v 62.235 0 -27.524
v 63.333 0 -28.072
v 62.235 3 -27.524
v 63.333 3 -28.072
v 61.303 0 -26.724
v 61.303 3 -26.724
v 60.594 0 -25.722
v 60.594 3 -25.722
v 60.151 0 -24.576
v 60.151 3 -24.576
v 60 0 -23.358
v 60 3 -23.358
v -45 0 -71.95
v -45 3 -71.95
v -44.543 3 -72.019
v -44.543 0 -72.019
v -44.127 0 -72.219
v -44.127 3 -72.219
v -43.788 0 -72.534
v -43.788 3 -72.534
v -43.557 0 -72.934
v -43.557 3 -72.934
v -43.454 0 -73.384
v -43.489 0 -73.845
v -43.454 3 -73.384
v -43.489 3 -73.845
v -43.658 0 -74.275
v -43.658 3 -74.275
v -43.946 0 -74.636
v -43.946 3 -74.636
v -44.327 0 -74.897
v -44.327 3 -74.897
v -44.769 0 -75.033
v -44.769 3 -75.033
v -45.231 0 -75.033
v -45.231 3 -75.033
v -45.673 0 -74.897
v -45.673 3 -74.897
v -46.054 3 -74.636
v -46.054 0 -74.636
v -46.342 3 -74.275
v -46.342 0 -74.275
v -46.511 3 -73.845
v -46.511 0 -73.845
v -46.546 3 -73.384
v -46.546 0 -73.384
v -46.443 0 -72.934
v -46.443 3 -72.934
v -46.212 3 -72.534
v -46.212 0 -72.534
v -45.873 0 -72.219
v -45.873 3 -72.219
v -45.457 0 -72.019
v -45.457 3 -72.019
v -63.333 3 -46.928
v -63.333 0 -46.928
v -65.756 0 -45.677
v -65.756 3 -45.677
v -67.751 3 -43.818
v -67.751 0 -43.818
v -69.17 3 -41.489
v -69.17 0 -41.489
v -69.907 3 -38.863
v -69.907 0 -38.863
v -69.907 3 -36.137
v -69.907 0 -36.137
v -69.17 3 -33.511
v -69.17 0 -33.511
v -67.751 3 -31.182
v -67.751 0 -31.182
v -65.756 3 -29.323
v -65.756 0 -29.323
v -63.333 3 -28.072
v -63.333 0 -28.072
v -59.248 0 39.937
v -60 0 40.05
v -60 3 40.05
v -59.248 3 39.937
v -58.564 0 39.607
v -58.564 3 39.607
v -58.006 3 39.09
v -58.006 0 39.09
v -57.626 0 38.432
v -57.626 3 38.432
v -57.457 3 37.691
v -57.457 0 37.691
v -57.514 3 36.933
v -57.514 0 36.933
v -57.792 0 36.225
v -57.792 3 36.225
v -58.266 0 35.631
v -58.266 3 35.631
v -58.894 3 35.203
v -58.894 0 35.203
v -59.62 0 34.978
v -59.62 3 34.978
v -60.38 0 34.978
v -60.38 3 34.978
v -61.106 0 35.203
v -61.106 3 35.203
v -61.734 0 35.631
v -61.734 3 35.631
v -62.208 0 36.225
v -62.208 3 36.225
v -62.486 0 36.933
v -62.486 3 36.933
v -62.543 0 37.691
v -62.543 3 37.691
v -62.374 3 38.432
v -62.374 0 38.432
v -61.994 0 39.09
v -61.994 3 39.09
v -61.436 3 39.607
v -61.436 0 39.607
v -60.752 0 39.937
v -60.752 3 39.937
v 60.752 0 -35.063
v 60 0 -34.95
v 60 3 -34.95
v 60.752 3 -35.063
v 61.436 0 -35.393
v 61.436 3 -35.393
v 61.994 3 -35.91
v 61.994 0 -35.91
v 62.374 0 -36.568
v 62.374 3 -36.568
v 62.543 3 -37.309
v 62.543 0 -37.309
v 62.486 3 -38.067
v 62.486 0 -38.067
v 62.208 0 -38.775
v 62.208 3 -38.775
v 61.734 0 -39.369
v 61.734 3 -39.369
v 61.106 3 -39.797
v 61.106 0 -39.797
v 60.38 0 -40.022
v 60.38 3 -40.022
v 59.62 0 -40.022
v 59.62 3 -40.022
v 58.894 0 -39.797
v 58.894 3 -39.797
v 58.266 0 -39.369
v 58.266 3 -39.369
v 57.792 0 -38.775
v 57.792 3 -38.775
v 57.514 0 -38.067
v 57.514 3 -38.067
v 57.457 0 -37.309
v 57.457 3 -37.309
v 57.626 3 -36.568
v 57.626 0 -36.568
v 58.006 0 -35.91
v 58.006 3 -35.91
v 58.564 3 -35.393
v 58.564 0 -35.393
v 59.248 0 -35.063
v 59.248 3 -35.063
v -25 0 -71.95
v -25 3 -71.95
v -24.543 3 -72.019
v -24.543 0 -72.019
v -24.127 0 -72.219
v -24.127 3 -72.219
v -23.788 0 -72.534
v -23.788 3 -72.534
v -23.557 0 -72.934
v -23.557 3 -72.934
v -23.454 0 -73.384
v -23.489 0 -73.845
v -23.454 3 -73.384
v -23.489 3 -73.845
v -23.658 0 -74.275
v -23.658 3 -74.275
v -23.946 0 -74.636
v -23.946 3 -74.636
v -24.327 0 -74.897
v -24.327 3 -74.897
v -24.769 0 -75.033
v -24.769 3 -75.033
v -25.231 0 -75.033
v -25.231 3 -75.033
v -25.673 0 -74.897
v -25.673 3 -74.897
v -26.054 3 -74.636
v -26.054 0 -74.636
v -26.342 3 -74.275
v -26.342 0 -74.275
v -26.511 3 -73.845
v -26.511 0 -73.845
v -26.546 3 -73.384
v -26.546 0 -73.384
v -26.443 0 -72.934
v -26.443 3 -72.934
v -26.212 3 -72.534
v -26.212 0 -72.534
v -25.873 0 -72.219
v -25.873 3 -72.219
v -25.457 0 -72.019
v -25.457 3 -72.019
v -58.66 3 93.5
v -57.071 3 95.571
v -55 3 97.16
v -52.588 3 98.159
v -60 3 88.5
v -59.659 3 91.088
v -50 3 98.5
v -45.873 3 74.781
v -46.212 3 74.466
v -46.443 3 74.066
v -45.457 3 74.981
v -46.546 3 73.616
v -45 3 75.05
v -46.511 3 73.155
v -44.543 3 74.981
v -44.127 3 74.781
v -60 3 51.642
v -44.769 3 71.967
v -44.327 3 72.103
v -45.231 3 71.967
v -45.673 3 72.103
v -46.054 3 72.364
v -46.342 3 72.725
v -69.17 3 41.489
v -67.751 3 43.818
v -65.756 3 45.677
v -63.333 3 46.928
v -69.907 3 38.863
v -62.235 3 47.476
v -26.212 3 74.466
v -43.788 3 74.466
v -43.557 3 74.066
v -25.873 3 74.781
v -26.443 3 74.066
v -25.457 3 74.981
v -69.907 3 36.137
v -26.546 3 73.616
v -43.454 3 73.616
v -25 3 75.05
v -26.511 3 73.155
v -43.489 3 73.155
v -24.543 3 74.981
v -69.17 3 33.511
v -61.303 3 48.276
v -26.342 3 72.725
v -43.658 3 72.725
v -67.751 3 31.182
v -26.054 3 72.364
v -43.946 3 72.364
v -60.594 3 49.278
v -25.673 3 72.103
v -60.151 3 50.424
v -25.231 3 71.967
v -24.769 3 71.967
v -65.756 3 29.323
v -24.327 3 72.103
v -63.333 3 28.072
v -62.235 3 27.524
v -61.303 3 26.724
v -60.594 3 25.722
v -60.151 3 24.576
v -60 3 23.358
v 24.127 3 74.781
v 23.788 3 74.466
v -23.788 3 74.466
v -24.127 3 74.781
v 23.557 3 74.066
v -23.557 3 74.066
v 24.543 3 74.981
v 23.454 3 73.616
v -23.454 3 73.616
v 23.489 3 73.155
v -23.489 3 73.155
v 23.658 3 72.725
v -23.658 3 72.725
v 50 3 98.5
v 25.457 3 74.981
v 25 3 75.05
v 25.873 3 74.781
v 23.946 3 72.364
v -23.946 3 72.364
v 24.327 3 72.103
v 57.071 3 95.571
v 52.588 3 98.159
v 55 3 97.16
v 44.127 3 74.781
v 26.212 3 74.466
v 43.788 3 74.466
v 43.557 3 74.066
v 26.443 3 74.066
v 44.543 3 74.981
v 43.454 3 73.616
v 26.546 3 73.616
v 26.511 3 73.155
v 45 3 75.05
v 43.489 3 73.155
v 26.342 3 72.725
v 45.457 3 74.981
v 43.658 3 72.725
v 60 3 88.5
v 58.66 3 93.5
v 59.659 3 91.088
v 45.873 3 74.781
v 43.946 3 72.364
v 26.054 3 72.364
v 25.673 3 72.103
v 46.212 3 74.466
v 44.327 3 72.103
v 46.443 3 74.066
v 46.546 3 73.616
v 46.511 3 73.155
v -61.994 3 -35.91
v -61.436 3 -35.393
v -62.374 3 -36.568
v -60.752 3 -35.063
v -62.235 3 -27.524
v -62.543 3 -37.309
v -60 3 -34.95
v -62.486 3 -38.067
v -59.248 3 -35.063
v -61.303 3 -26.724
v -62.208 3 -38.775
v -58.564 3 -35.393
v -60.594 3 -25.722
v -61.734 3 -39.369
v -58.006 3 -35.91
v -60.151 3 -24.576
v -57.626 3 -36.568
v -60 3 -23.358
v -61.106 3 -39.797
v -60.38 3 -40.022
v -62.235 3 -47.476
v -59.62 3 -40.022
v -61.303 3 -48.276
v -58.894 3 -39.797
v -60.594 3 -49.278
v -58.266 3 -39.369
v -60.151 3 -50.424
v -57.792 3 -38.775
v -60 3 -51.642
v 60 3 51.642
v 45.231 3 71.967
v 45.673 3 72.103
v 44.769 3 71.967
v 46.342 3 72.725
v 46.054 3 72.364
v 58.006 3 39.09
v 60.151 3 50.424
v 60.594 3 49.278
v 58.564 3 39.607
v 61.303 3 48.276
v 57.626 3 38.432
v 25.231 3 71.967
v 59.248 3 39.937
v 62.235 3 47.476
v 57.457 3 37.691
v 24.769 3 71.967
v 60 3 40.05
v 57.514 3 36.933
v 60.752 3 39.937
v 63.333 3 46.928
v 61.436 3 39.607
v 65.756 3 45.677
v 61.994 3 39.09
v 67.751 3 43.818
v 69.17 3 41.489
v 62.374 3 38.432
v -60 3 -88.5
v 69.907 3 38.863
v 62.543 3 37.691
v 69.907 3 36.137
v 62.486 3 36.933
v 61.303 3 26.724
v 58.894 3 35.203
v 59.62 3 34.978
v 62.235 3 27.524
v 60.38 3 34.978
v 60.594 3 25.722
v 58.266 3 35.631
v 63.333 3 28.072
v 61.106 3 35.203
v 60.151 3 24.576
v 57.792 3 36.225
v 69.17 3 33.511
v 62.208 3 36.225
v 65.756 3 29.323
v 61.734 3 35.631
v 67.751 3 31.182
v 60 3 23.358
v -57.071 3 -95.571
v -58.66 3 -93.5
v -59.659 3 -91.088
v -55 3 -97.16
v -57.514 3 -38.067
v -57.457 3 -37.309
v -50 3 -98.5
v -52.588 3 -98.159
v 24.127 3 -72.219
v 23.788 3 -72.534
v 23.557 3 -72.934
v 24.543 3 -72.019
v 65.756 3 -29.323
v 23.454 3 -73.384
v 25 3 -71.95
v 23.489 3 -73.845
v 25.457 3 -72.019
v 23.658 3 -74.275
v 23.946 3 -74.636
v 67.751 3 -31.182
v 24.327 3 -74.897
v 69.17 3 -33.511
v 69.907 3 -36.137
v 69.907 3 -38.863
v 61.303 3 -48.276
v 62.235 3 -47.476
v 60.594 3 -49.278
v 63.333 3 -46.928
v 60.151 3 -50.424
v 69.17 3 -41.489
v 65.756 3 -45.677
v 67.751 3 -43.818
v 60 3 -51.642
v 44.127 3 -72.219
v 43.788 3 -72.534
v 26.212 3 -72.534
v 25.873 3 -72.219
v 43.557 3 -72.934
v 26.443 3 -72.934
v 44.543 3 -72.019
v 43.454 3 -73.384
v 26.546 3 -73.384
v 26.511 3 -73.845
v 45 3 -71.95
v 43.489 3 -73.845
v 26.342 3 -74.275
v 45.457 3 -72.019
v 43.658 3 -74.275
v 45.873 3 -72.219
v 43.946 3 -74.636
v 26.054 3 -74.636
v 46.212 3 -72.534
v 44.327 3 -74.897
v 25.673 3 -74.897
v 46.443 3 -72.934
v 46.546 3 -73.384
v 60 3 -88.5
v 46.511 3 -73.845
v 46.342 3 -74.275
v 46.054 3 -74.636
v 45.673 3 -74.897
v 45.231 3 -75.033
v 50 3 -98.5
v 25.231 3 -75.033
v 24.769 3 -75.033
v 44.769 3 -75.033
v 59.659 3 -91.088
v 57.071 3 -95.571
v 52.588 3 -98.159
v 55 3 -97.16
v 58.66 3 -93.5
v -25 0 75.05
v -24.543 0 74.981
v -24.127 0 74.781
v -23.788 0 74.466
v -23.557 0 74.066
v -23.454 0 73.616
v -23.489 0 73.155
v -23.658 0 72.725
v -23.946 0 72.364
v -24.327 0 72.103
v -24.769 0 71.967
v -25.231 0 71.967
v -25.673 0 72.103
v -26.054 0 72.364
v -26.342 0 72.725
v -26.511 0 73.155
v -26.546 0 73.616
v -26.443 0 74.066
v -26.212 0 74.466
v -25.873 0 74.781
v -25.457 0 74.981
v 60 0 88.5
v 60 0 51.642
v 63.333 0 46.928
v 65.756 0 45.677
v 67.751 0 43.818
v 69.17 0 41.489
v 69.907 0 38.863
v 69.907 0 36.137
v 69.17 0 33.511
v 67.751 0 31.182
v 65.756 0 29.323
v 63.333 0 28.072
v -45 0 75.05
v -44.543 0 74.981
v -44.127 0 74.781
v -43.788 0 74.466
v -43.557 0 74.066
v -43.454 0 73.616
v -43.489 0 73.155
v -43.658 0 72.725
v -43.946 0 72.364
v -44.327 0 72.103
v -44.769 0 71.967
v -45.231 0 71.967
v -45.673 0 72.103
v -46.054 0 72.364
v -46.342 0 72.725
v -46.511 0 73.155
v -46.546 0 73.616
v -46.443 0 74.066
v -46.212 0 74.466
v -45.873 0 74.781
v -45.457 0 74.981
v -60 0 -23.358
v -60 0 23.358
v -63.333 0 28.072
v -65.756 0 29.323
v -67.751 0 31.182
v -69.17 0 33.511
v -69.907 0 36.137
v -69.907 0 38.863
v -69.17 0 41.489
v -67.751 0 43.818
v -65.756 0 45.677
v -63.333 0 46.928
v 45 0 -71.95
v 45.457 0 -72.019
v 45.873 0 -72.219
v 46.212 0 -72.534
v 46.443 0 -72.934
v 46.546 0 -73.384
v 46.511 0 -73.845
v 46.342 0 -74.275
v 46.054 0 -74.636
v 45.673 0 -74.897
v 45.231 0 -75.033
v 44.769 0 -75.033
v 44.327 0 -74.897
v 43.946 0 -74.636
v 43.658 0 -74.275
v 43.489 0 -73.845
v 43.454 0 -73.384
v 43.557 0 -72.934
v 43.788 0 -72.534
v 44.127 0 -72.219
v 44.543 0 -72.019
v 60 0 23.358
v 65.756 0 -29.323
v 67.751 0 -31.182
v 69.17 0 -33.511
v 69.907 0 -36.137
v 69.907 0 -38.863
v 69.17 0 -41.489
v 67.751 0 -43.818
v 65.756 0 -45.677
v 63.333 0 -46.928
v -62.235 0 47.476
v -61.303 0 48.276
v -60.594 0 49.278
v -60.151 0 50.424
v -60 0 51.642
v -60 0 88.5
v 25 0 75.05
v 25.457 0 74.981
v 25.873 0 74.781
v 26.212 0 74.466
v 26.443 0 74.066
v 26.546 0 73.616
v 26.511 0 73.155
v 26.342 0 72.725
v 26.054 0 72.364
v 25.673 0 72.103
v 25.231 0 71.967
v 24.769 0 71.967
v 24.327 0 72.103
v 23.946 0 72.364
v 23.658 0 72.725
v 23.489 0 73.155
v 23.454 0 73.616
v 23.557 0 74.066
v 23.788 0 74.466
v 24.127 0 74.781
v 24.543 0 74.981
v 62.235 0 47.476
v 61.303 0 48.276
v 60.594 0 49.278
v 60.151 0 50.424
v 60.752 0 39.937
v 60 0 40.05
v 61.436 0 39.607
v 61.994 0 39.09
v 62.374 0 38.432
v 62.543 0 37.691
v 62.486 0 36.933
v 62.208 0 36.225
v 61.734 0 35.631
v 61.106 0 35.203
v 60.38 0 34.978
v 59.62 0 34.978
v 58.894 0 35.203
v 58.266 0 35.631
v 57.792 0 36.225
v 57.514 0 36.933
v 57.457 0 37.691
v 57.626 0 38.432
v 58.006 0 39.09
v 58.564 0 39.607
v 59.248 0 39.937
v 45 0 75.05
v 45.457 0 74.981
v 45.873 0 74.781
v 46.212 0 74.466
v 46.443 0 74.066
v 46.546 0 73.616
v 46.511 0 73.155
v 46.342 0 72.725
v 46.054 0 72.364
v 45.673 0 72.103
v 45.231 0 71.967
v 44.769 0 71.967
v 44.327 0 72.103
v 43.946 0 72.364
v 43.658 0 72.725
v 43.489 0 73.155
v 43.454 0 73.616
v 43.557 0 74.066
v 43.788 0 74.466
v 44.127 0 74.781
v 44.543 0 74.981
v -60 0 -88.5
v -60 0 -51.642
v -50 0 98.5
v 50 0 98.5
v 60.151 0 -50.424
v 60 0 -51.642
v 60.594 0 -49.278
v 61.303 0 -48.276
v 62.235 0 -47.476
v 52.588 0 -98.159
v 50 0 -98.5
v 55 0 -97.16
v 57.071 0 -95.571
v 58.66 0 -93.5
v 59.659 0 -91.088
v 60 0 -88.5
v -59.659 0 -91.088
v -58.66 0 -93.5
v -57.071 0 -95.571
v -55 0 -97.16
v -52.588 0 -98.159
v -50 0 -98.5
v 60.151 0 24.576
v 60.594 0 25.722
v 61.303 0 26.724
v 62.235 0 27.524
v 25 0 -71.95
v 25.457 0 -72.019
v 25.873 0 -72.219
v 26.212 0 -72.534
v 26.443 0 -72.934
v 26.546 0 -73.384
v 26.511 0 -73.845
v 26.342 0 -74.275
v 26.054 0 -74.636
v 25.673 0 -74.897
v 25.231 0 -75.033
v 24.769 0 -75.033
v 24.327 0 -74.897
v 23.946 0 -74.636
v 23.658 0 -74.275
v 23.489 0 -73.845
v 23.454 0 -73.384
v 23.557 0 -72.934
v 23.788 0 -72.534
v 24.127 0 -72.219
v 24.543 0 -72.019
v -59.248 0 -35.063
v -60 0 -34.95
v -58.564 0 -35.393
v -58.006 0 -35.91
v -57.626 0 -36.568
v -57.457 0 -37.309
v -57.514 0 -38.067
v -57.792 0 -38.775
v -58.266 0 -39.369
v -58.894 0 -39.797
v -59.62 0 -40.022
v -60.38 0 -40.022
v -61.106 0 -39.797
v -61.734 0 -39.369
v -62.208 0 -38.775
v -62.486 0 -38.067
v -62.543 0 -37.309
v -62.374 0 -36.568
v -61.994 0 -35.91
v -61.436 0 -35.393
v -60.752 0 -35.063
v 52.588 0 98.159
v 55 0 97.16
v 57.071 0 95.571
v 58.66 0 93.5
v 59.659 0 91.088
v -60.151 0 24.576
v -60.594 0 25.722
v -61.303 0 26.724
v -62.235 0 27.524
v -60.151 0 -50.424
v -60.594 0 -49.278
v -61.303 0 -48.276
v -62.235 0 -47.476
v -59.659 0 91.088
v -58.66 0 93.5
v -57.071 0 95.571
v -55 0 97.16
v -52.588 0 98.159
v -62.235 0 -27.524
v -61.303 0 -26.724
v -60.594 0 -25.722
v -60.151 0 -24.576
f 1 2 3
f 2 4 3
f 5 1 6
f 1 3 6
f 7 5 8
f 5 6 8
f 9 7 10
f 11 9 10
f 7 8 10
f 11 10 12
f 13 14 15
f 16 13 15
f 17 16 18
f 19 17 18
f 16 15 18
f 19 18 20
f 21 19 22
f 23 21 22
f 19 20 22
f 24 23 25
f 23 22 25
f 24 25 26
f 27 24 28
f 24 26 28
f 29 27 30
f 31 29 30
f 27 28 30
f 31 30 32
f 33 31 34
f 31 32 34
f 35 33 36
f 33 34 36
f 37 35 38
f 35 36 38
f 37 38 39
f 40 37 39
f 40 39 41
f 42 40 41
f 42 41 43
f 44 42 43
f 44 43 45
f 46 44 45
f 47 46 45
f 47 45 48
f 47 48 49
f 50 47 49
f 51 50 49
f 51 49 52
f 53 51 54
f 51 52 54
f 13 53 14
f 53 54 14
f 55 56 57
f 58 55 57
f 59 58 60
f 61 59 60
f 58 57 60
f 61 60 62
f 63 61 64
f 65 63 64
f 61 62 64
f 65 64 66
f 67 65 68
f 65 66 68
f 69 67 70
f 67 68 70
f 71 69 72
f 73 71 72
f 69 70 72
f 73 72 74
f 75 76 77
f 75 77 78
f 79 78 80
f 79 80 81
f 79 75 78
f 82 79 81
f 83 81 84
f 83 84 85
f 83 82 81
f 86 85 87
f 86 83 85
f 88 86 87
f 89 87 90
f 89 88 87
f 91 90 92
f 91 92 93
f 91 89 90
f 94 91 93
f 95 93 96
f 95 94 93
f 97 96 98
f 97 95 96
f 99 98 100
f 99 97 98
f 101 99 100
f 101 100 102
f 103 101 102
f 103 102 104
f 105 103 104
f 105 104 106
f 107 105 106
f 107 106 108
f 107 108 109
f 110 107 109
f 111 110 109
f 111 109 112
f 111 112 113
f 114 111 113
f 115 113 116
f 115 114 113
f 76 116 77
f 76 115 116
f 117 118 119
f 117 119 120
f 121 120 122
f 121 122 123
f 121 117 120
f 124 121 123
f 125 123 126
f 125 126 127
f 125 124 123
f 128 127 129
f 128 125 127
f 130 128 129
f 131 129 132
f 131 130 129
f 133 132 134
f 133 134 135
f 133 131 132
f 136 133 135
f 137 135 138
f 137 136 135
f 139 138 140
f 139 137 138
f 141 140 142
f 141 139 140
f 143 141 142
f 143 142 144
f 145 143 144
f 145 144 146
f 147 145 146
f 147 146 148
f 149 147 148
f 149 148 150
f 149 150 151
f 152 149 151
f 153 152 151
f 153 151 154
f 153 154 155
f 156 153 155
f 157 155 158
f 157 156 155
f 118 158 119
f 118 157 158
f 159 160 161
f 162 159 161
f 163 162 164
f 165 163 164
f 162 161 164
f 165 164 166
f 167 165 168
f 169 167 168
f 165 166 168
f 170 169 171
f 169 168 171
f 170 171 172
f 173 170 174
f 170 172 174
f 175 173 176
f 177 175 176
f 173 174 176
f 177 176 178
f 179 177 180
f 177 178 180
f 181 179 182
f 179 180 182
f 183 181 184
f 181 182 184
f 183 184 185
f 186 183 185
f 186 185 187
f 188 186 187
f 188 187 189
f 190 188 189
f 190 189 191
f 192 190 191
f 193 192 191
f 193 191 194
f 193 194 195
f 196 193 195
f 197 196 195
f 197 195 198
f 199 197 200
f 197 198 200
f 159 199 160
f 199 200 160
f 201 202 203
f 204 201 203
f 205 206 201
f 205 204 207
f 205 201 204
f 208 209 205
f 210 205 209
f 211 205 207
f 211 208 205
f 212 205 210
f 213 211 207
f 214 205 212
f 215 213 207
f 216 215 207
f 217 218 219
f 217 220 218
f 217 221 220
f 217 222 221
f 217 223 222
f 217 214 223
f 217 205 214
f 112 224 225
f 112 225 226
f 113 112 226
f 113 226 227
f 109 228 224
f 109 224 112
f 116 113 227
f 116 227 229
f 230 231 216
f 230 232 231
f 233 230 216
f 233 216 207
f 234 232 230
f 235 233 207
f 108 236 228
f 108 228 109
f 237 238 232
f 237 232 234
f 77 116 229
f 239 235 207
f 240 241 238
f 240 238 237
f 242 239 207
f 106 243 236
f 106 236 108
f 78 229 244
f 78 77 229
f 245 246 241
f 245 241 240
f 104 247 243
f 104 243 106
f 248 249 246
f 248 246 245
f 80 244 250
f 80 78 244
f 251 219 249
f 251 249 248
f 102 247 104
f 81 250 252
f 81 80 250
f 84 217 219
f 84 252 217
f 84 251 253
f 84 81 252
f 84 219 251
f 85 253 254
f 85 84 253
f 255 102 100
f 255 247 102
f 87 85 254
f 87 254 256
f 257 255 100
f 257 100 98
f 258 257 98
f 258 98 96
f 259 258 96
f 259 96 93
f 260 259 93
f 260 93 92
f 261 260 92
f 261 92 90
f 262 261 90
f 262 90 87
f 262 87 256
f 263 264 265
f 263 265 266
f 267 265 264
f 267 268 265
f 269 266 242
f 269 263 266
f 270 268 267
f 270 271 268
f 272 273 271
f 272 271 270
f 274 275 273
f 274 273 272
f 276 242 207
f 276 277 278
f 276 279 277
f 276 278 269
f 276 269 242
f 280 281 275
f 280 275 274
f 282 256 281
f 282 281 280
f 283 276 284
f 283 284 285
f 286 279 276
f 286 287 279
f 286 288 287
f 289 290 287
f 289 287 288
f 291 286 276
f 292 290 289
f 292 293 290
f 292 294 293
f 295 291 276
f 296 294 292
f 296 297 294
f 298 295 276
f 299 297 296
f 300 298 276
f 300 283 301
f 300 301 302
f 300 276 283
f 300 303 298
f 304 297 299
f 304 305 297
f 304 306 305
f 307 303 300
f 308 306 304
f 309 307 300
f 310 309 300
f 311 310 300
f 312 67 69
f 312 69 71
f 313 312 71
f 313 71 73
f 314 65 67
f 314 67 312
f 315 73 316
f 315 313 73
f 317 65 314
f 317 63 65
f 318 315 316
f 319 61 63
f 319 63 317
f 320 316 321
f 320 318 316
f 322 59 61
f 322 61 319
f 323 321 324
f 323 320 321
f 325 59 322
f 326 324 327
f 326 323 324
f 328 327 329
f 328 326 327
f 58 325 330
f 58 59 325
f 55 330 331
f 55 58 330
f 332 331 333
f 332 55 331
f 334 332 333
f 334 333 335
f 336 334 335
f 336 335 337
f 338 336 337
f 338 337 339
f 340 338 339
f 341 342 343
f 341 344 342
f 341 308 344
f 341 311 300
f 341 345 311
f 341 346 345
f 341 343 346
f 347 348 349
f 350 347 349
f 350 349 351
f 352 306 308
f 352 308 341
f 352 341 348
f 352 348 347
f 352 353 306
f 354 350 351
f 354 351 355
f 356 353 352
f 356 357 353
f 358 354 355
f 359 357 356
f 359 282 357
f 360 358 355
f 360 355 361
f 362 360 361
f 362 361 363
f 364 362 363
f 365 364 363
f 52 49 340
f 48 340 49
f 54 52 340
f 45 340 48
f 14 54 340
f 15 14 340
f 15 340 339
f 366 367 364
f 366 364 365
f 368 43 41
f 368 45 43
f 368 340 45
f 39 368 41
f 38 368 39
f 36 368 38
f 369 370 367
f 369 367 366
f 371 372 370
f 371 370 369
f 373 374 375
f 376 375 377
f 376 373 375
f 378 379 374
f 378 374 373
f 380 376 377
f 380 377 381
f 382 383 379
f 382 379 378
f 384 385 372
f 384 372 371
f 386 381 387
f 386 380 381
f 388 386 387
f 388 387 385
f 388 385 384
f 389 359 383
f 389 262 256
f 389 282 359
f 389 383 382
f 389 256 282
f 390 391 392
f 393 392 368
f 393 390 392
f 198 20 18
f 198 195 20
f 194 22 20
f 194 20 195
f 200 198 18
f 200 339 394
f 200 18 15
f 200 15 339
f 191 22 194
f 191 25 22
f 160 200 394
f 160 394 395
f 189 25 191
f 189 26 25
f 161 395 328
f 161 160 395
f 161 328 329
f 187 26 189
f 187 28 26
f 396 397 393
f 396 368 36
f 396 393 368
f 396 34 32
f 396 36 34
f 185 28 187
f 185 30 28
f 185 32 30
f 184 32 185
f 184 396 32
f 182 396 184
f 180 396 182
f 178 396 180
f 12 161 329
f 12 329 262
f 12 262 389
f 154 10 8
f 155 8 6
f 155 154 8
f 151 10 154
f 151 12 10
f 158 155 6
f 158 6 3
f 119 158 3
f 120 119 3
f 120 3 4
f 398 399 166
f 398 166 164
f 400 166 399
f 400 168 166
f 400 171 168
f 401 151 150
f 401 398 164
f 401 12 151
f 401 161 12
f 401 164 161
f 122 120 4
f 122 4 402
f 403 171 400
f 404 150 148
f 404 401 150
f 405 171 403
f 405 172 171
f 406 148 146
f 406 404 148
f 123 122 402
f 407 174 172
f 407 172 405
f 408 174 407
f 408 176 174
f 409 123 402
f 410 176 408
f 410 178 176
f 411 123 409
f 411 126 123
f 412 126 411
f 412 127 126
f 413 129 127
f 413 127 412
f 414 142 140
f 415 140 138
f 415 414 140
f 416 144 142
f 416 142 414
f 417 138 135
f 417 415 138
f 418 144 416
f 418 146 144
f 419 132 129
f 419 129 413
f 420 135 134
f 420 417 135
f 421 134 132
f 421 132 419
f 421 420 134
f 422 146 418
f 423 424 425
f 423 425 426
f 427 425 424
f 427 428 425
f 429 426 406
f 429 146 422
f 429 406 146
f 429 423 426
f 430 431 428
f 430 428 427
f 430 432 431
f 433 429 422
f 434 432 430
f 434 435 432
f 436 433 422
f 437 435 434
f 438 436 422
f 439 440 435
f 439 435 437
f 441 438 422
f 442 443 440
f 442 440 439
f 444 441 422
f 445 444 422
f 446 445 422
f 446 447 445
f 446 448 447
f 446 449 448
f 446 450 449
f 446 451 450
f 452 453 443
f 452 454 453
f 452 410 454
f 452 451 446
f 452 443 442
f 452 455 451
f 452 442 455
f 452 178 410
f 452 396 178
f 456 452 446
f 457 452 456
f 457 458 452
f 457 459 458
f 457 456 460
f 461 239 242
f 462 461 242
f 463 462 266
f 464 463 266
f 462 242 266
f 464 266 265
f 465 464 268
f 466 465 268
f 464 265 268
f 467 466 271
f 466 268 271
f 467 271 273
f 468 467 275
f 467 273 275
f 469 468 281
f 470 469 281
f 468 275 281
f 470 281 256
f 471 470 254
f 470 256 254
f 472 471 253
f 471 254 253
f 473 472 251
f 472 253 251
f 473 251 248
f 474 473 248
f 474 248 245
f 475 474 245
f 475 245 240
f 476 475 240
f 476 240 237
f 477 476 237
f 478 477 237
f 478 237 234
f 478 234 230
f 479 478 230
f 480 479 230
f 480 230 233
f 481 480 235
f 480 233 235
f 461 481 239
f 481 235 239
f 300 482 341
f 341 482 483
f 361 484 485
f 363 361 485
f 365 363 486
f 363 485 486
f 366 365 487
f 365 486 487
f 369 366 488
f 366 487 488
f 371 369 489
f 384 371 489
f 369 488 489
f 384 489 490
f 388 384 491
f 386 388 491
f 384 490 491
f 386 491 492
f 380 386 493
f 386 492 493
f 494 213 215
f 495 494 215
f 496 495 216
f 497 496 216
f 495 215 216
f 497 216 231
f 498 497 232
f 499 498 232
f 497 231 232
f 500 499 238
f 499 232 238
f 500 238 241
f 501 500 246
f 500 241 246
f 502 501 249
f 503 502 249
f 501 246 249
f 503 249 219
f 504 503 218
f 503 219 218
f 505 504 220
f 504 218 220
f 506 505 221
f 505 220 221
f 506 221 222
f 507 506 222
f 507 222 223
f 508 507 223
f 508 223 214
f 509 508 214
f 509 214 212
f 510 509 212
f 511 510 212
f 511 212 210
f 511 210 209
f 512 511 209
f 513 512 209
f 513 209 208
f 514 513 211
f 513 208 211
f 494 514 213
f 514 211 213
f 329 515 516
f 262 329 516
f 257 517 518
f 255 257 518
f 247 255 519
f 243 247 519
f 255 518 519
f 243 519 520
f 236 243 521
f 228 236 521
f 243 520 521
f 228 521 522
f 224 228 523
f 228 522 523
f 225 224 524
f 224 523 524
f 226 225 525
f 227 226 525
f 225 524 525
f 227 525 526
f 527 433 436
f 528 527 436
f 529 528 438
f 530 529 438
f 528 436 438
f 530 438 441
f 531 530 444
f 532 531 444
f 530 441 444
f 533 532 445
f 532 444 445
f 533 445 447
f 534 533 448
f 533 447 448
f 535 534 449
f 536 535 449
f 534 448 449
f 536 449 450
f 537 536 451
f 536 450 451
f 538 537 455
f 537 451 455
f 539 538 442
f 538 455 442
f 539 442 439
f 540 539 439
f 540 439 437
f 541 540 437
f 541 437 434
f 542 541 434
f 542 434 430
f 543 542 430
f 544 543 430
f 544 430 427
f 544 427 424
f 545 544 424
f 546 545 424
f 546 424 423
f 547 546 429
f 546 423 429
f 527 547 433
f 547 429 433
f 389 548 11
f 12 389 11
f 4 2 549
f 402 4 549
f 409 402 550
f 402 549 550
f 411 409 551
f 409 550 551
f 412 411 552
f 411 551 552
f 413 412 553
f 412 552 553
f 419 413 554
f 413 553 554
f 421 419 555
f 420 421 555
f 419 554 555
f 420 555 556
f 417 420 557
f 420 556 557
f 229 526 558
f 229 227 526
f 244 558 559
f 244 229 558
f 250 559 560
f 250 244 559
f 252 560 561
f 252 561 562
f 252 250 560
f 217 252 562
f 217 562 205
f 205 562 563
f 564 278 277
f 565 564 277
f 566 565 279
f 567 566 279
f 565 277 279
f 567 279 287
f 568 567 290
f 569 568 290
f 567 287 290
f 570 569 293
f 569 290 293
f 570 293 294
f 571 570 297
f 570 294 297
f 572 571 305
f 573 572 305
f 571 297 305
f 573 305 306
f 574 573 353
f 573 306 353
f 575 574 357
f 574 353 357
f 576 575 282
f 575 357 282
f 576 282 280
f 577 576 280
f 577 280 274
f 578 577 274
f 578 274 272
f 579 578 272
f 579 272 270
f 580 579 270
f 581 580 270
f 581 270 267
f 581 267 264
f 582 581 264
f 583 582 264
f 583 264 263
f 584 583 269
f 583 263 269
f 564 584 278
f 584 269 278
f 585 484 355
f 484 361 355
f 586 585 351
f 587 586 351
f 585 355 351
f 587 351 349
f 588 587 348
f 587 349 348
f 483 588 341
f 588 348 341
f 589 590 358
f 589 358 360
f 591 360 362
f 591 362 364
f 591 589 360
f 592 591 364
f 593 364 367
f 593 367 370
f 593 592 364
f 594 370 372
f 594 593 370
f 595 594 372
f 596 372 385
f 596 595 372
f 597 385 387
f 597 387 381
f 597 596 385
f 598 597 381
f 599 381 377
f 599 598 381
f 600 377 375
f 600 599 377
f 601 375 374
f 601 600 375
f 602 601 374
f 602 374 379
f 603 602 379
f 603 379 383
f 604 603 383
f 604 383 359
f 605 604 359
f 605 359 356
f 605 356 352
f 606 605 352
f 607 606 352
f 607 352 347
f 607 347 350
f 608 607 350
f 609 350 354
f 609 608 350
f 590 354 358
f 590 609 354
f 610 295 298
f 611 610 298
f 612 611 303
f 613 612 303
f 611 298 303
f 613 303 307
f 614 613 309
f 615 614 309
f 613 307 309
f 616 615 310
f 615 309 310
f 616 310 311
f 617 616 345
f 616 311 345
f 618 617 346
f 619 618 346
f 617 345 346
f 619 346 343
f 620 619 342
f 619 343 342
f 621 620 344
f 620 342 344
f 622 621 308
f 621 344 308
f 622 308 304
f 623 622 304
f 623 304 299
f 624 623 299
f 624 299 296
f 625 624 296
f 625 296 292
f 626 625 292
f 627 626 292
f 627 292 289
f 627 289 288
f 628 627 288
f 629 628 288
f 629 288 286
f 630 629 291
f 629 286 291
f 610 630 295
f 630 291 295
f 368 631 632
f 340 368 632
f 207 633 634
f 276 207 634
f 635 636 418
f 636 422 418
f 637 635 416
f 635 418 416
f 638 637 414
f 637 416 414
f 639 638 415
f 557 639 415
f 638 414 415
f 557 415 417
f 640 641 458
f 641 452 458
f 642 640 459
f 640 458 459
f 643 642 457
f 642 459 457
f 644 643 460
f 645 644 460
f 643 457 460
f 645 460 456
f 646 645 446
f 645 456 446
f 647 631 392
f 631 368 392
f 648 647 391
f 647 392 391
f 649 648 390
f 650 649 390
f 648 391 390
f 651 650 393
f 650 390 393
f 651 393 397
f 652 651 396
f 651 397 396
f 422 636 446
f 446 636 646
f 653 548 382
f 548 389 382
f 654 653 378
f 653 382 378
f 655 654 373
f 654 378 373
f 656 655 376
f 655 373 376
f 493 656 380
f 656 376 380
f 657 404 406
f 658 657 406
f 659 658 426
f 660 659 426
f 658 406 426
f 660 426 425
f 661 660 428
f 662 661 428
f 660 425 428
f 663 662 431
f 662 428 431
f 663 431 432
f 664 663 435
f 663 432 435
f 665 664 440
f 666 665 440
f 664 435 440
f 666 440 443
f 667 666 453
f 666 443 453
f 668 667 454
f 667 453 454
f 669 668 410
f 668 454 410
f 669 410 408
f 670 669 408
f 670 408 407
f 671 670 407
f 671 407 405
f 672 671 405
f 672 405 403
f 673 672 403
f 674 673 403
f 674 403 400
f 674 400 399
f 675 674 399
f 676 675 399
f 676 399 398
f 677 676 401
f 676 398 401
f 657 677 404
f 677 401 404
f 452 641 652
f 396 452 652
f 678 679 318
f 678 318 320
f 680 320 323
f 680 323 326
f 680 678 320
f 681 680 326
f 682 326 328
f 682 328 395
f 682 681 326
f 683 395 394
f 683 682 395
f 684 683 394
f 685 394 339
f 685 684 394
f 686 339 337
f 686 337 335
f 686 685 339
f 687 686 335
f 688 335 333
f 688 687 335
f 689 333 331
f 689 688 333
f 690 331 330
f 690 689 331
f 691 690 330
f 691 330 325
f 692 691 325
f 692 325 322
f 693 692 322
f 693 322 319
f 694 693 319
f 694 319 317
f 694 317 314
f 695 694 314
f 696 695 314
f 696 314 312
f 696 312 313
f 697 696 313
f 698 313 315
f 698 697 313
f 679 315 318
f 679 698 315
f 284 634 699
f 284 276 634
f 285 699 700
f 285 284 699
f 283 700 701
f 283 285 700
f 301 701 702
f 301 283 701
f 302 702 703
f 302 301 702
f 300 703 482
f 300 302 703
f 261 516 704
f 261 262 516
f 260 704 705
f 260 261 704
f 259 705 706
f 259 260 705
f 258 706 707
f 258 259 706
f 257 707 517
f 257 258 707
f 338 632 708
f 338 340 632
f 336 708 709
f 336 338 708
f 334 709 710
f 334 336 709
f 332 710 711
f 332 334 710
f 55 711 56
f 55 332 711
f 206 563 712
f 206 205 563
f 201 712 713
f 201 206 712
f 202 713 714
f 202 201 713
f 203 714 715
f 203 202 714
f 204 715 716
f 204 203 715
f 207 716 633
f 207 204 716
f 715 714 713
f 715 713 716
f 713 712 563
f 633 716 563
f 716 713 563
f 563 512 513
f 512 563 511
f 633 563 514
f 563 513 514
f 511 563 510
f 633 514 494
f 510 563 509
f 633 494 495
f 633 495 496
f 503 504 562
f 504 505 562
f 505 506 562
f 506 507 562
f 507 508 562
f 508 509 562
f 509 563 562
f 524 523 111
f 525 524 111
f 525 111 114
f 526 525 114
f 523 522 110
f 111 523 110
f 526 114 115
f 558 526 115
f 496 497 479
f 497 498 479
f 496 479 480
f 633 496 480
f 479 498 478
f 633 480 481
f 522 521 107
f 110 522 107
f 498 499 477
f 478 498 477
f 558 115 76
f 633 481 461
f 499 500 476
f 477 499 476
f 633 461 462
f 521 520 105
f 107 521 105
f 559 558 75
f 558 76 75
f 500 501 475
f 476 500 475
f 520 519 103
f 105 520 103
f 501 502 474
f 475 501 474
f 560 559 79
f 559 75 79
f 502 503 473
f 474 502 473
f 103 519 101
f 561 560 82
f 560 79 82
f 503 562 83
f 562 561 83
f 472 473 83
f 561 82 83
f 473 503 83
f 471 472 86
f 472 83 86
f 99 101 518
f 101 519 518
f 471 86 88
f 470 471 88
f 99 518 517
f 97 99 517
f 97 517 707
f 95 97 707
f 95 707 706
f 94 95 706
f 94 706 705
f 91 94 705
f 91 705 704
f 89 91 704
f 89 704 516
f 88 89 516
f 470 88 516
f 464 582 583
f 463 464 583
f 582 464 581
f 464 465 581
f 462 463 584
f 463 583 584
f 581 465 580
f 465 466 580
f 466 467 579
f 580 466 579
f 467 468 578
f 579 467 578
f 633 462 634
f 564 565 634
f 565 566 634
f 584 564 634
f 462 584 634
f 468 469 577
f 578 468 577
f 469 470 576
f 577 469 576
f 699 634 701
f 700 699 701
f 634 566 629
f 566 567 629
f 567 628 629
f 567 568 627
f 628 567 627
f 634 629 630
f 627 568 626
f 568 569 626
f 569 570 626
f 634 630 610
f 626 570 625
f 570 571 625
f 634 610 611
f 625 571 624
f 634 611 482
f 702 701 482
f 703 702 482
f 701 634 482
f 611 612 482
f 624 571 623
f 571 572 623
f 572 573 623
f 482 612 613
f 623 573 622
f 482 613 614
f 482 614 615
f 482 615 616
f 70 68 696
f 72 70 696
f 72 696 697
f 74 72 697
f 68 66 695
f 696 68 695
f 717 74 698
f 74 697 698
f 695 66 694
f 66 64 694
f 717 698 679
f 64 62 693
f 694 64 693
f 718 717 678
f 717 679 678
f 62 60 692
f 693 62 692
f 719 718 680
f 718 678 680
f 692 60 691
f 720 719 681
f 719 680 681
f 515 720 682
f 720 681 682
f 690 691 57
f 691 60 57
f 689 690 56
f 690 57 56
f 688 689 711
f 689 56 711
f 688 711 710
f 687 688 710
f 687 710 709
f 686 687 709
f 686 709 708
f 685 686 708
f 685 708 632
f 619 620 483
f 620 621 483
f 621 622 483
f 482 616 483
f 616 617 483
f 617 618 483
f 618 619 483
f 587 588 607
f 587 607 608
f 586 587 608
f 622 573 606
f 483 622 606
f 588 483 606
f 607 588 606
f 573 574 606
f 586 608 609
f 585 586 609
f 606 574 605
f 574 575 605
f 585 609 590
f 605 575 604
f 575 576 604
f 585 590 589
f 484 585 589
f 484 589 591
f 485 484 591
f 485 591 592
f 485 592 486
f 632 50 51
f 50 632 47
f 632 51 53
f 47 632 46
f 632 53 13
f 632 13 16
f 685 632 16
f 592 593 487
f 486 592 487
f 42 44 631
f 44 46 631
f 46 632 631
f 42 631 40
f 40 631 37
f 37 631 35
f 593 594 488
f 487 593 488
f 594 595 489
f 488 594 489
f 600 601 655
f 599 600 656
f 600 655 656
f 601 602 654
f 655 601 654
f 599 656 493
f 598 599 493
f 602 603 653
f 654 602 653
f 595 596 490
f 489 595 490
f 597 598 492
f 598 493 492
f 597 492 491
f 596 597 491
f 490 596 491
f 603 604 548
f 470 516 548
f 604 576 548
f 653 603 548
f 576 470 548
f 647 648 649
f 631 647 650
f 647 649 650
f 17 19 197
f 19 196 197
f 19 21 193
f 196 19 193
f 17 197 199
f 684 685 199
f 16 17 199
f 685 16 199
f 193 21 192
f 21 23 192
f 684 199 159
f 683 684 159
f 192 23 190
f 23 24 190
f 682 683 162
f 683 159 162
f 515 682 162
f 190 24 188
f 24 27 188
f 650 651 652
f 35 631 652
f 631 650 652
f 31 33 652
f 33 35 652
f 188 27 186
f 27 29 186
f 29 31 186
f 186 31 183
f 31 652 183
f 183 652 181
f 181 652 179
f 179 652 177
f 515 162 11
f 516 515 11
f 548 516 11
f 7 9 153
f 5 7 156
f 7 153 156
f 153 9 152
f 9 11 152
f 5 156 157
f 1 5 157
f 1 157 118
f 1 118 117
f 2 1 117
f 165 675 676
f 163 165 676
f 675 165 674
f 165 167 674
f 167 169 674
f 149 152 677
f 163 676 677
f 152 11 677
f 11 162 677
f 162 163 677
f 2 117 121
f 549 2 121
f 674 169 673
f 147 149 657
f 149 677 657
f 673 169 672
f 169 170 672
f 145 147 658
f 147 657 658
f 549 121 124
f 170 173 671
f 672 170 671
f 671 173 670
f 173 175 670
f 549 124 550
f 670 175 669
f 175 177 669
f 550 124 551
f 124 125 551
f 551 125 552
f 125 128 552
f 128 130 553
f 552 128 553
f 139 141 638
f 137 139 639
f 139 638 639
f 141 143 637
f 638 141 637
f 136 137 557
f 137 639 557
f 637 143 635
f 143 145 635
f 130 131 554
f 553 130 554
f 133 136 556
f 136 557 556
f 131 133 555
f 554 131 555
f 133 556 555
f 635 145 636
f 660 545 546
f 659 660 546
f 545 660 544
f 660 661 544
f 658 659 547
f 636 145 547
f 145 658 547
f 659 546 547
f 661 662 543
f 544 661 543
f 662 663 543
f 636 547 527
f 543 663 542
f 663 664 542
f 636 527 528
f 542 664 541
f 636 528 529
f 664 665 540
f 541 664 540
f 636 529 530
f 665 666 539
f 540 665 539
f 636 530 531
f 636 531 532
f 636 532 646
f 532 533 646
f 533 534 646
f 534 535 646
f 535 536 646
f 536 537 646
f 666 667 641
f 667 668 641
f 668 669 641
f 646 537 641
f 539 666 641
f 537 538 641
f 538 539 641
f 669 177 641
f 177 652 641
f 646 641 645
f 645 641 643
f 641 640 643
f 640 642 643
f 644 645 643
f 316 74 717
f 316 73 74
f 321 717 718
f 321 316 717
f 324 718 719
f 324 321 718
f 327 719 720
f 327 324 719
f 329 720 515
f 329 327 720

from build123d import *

# Parameters (mm, degrees)
SKETCH1_R           = 2.55
BOSS_EXTRUDE1_DEPTH = 3
SKETCH2_R           = 1.55
GIMBALHOLES_DEPTH   = 3
FILLET1_R           = 10
FILLET2_R           = 5


with BuildPart() as part:
    # Sketch1 → Boss-Extrude1 (new body)
    with BuildSketch(Plane(origin=(0, 0, 0), x_dir=(1, 0, 0), z_dir=(0, 1, 0))):
        with BuildLine():
            Line((-60, 27.5), (-60, -27.5))
            ThreePointArc((-60, -27.5), (-70, -37.5), (-60, -47.5))
            Line((-60, -47.5), (-60, -98.5))
            Line((-60, -98.5), (60.000001096, -98.5))
            Line((60.000001096, -98.5), (60.000001096, -47.5))
            ThreePointArc((60.000001096, -47.5), (70, -37.499999452), (60, -27.5))
            Line((60, -27.5), (60, 27.5))
            ThreePointArc((60, 27.5), (70, 37.499999452), (60.000001096, 47.5))
            Line((60.000001096, 47.5), (60.000001096, 98.5))
            Line((60.000001096, 98.5), (-60, 98.5))
            Line((-60, 98.5), (-60, 47.5))
            ThreePointArc((-60, 47.5), (-70, 37.5), (-60, 27.5))
        make_face()
        with Locations(Location((-60, 37.5, 0), (0, 0, 270))):
            Circle(SKETCH1_R, mode=Mode.SUBTRACT)
        with Locations(Location((60, 37.5, 0), (0, 0, 270))):
            Circle(SKETCH1_R, mode=Mode.SUBTRACT)
        with Locations(Location((-60, -37.5, 0), (0, 0, 270))):
            Circle(SKETCH1_R, mode=Mode.SUBTRACT)
        with Locations(Location((60, -37.5, 0), (0, 0, 270))):
            Circle(SKETCH1_R, mode=Mode.SUBTRACT)
    extrude(amount=BOSS_EXTRUDE1_DEPTH)

    # Sketch2 → GimbalHoles (cut)
    with BuildSketch(Plane(origin=(0, 3, 0), x_dir=(1, 0, 0), z_dir=(0, 1, 0))):
        with Locations(Location((-44.999998904, 73.5, 0), (0, 0, 270))):
            Circle(SKETCH2_R)
        with Locations(Location((-24.999998904, 73.5, 0), (0, 0, 270))):
            Circle(SKETCH2_R)
        with Locations(Location((25.000001096, 73.5, 0), (0, 0, 270))):
            Circle(SKETCH2_R)
        with Locations(Location((45.000001096, 73.5, 0), (0, 0, 270))):
            Circle(SKETCH2_R)
        with Locations(Location((-44.999998904, -73.5, 0), (0, 0, 270))):
            Circle(SKETCH2_R)
        with Locations(Location((-24.999998904, -73.5, 0), (0, 0, 270))):
            Circle(SKETCH2_R)
        with Locations(Location((25.000001096, -73.5, 0), (0, 0, 270))):
            Circle(SKETCH2_R)
        with Locations(Location((45.000001096, -73.5, 0), (0, 0, 270))):
            Circle(SKETCH2_R)
    extrude(amount=-GIMBALHOLES_DEPTH, mode=Mode.SUBTRACT)

    # Fillet1
    fillet1_edges = [part.edges().sort_by_distance(p)[0] for p in [
        (-60, 1.5, -98.5),
        (60.000001096, 1.5, -98.5),
        (60.000001096, 1.5, 98.5),
        (-60, 1.5, 98.5),
    ]]
    fillet(fillet1_edges, radius=FILLET1_R)

    # Fillet2
    fillet2_edges = [part.edges().sort_by_distance(p)[0] for p in [
        (-60, 1.5, -47.5),
        (60.000001096, 1.5, -47.5),
        (60, 1.5, -27.5),
        (60, 1.5, 27.5),
        (60.000001096, 1.5, 47.5),
        (-60, 1.5, 47.5),
        (-60, 1.5, 27.5),
        (-60, 1.5, -27.5),
    ]]
    fillet(fillet2_edges, radius=FILLET2_R)


solid = part.part
